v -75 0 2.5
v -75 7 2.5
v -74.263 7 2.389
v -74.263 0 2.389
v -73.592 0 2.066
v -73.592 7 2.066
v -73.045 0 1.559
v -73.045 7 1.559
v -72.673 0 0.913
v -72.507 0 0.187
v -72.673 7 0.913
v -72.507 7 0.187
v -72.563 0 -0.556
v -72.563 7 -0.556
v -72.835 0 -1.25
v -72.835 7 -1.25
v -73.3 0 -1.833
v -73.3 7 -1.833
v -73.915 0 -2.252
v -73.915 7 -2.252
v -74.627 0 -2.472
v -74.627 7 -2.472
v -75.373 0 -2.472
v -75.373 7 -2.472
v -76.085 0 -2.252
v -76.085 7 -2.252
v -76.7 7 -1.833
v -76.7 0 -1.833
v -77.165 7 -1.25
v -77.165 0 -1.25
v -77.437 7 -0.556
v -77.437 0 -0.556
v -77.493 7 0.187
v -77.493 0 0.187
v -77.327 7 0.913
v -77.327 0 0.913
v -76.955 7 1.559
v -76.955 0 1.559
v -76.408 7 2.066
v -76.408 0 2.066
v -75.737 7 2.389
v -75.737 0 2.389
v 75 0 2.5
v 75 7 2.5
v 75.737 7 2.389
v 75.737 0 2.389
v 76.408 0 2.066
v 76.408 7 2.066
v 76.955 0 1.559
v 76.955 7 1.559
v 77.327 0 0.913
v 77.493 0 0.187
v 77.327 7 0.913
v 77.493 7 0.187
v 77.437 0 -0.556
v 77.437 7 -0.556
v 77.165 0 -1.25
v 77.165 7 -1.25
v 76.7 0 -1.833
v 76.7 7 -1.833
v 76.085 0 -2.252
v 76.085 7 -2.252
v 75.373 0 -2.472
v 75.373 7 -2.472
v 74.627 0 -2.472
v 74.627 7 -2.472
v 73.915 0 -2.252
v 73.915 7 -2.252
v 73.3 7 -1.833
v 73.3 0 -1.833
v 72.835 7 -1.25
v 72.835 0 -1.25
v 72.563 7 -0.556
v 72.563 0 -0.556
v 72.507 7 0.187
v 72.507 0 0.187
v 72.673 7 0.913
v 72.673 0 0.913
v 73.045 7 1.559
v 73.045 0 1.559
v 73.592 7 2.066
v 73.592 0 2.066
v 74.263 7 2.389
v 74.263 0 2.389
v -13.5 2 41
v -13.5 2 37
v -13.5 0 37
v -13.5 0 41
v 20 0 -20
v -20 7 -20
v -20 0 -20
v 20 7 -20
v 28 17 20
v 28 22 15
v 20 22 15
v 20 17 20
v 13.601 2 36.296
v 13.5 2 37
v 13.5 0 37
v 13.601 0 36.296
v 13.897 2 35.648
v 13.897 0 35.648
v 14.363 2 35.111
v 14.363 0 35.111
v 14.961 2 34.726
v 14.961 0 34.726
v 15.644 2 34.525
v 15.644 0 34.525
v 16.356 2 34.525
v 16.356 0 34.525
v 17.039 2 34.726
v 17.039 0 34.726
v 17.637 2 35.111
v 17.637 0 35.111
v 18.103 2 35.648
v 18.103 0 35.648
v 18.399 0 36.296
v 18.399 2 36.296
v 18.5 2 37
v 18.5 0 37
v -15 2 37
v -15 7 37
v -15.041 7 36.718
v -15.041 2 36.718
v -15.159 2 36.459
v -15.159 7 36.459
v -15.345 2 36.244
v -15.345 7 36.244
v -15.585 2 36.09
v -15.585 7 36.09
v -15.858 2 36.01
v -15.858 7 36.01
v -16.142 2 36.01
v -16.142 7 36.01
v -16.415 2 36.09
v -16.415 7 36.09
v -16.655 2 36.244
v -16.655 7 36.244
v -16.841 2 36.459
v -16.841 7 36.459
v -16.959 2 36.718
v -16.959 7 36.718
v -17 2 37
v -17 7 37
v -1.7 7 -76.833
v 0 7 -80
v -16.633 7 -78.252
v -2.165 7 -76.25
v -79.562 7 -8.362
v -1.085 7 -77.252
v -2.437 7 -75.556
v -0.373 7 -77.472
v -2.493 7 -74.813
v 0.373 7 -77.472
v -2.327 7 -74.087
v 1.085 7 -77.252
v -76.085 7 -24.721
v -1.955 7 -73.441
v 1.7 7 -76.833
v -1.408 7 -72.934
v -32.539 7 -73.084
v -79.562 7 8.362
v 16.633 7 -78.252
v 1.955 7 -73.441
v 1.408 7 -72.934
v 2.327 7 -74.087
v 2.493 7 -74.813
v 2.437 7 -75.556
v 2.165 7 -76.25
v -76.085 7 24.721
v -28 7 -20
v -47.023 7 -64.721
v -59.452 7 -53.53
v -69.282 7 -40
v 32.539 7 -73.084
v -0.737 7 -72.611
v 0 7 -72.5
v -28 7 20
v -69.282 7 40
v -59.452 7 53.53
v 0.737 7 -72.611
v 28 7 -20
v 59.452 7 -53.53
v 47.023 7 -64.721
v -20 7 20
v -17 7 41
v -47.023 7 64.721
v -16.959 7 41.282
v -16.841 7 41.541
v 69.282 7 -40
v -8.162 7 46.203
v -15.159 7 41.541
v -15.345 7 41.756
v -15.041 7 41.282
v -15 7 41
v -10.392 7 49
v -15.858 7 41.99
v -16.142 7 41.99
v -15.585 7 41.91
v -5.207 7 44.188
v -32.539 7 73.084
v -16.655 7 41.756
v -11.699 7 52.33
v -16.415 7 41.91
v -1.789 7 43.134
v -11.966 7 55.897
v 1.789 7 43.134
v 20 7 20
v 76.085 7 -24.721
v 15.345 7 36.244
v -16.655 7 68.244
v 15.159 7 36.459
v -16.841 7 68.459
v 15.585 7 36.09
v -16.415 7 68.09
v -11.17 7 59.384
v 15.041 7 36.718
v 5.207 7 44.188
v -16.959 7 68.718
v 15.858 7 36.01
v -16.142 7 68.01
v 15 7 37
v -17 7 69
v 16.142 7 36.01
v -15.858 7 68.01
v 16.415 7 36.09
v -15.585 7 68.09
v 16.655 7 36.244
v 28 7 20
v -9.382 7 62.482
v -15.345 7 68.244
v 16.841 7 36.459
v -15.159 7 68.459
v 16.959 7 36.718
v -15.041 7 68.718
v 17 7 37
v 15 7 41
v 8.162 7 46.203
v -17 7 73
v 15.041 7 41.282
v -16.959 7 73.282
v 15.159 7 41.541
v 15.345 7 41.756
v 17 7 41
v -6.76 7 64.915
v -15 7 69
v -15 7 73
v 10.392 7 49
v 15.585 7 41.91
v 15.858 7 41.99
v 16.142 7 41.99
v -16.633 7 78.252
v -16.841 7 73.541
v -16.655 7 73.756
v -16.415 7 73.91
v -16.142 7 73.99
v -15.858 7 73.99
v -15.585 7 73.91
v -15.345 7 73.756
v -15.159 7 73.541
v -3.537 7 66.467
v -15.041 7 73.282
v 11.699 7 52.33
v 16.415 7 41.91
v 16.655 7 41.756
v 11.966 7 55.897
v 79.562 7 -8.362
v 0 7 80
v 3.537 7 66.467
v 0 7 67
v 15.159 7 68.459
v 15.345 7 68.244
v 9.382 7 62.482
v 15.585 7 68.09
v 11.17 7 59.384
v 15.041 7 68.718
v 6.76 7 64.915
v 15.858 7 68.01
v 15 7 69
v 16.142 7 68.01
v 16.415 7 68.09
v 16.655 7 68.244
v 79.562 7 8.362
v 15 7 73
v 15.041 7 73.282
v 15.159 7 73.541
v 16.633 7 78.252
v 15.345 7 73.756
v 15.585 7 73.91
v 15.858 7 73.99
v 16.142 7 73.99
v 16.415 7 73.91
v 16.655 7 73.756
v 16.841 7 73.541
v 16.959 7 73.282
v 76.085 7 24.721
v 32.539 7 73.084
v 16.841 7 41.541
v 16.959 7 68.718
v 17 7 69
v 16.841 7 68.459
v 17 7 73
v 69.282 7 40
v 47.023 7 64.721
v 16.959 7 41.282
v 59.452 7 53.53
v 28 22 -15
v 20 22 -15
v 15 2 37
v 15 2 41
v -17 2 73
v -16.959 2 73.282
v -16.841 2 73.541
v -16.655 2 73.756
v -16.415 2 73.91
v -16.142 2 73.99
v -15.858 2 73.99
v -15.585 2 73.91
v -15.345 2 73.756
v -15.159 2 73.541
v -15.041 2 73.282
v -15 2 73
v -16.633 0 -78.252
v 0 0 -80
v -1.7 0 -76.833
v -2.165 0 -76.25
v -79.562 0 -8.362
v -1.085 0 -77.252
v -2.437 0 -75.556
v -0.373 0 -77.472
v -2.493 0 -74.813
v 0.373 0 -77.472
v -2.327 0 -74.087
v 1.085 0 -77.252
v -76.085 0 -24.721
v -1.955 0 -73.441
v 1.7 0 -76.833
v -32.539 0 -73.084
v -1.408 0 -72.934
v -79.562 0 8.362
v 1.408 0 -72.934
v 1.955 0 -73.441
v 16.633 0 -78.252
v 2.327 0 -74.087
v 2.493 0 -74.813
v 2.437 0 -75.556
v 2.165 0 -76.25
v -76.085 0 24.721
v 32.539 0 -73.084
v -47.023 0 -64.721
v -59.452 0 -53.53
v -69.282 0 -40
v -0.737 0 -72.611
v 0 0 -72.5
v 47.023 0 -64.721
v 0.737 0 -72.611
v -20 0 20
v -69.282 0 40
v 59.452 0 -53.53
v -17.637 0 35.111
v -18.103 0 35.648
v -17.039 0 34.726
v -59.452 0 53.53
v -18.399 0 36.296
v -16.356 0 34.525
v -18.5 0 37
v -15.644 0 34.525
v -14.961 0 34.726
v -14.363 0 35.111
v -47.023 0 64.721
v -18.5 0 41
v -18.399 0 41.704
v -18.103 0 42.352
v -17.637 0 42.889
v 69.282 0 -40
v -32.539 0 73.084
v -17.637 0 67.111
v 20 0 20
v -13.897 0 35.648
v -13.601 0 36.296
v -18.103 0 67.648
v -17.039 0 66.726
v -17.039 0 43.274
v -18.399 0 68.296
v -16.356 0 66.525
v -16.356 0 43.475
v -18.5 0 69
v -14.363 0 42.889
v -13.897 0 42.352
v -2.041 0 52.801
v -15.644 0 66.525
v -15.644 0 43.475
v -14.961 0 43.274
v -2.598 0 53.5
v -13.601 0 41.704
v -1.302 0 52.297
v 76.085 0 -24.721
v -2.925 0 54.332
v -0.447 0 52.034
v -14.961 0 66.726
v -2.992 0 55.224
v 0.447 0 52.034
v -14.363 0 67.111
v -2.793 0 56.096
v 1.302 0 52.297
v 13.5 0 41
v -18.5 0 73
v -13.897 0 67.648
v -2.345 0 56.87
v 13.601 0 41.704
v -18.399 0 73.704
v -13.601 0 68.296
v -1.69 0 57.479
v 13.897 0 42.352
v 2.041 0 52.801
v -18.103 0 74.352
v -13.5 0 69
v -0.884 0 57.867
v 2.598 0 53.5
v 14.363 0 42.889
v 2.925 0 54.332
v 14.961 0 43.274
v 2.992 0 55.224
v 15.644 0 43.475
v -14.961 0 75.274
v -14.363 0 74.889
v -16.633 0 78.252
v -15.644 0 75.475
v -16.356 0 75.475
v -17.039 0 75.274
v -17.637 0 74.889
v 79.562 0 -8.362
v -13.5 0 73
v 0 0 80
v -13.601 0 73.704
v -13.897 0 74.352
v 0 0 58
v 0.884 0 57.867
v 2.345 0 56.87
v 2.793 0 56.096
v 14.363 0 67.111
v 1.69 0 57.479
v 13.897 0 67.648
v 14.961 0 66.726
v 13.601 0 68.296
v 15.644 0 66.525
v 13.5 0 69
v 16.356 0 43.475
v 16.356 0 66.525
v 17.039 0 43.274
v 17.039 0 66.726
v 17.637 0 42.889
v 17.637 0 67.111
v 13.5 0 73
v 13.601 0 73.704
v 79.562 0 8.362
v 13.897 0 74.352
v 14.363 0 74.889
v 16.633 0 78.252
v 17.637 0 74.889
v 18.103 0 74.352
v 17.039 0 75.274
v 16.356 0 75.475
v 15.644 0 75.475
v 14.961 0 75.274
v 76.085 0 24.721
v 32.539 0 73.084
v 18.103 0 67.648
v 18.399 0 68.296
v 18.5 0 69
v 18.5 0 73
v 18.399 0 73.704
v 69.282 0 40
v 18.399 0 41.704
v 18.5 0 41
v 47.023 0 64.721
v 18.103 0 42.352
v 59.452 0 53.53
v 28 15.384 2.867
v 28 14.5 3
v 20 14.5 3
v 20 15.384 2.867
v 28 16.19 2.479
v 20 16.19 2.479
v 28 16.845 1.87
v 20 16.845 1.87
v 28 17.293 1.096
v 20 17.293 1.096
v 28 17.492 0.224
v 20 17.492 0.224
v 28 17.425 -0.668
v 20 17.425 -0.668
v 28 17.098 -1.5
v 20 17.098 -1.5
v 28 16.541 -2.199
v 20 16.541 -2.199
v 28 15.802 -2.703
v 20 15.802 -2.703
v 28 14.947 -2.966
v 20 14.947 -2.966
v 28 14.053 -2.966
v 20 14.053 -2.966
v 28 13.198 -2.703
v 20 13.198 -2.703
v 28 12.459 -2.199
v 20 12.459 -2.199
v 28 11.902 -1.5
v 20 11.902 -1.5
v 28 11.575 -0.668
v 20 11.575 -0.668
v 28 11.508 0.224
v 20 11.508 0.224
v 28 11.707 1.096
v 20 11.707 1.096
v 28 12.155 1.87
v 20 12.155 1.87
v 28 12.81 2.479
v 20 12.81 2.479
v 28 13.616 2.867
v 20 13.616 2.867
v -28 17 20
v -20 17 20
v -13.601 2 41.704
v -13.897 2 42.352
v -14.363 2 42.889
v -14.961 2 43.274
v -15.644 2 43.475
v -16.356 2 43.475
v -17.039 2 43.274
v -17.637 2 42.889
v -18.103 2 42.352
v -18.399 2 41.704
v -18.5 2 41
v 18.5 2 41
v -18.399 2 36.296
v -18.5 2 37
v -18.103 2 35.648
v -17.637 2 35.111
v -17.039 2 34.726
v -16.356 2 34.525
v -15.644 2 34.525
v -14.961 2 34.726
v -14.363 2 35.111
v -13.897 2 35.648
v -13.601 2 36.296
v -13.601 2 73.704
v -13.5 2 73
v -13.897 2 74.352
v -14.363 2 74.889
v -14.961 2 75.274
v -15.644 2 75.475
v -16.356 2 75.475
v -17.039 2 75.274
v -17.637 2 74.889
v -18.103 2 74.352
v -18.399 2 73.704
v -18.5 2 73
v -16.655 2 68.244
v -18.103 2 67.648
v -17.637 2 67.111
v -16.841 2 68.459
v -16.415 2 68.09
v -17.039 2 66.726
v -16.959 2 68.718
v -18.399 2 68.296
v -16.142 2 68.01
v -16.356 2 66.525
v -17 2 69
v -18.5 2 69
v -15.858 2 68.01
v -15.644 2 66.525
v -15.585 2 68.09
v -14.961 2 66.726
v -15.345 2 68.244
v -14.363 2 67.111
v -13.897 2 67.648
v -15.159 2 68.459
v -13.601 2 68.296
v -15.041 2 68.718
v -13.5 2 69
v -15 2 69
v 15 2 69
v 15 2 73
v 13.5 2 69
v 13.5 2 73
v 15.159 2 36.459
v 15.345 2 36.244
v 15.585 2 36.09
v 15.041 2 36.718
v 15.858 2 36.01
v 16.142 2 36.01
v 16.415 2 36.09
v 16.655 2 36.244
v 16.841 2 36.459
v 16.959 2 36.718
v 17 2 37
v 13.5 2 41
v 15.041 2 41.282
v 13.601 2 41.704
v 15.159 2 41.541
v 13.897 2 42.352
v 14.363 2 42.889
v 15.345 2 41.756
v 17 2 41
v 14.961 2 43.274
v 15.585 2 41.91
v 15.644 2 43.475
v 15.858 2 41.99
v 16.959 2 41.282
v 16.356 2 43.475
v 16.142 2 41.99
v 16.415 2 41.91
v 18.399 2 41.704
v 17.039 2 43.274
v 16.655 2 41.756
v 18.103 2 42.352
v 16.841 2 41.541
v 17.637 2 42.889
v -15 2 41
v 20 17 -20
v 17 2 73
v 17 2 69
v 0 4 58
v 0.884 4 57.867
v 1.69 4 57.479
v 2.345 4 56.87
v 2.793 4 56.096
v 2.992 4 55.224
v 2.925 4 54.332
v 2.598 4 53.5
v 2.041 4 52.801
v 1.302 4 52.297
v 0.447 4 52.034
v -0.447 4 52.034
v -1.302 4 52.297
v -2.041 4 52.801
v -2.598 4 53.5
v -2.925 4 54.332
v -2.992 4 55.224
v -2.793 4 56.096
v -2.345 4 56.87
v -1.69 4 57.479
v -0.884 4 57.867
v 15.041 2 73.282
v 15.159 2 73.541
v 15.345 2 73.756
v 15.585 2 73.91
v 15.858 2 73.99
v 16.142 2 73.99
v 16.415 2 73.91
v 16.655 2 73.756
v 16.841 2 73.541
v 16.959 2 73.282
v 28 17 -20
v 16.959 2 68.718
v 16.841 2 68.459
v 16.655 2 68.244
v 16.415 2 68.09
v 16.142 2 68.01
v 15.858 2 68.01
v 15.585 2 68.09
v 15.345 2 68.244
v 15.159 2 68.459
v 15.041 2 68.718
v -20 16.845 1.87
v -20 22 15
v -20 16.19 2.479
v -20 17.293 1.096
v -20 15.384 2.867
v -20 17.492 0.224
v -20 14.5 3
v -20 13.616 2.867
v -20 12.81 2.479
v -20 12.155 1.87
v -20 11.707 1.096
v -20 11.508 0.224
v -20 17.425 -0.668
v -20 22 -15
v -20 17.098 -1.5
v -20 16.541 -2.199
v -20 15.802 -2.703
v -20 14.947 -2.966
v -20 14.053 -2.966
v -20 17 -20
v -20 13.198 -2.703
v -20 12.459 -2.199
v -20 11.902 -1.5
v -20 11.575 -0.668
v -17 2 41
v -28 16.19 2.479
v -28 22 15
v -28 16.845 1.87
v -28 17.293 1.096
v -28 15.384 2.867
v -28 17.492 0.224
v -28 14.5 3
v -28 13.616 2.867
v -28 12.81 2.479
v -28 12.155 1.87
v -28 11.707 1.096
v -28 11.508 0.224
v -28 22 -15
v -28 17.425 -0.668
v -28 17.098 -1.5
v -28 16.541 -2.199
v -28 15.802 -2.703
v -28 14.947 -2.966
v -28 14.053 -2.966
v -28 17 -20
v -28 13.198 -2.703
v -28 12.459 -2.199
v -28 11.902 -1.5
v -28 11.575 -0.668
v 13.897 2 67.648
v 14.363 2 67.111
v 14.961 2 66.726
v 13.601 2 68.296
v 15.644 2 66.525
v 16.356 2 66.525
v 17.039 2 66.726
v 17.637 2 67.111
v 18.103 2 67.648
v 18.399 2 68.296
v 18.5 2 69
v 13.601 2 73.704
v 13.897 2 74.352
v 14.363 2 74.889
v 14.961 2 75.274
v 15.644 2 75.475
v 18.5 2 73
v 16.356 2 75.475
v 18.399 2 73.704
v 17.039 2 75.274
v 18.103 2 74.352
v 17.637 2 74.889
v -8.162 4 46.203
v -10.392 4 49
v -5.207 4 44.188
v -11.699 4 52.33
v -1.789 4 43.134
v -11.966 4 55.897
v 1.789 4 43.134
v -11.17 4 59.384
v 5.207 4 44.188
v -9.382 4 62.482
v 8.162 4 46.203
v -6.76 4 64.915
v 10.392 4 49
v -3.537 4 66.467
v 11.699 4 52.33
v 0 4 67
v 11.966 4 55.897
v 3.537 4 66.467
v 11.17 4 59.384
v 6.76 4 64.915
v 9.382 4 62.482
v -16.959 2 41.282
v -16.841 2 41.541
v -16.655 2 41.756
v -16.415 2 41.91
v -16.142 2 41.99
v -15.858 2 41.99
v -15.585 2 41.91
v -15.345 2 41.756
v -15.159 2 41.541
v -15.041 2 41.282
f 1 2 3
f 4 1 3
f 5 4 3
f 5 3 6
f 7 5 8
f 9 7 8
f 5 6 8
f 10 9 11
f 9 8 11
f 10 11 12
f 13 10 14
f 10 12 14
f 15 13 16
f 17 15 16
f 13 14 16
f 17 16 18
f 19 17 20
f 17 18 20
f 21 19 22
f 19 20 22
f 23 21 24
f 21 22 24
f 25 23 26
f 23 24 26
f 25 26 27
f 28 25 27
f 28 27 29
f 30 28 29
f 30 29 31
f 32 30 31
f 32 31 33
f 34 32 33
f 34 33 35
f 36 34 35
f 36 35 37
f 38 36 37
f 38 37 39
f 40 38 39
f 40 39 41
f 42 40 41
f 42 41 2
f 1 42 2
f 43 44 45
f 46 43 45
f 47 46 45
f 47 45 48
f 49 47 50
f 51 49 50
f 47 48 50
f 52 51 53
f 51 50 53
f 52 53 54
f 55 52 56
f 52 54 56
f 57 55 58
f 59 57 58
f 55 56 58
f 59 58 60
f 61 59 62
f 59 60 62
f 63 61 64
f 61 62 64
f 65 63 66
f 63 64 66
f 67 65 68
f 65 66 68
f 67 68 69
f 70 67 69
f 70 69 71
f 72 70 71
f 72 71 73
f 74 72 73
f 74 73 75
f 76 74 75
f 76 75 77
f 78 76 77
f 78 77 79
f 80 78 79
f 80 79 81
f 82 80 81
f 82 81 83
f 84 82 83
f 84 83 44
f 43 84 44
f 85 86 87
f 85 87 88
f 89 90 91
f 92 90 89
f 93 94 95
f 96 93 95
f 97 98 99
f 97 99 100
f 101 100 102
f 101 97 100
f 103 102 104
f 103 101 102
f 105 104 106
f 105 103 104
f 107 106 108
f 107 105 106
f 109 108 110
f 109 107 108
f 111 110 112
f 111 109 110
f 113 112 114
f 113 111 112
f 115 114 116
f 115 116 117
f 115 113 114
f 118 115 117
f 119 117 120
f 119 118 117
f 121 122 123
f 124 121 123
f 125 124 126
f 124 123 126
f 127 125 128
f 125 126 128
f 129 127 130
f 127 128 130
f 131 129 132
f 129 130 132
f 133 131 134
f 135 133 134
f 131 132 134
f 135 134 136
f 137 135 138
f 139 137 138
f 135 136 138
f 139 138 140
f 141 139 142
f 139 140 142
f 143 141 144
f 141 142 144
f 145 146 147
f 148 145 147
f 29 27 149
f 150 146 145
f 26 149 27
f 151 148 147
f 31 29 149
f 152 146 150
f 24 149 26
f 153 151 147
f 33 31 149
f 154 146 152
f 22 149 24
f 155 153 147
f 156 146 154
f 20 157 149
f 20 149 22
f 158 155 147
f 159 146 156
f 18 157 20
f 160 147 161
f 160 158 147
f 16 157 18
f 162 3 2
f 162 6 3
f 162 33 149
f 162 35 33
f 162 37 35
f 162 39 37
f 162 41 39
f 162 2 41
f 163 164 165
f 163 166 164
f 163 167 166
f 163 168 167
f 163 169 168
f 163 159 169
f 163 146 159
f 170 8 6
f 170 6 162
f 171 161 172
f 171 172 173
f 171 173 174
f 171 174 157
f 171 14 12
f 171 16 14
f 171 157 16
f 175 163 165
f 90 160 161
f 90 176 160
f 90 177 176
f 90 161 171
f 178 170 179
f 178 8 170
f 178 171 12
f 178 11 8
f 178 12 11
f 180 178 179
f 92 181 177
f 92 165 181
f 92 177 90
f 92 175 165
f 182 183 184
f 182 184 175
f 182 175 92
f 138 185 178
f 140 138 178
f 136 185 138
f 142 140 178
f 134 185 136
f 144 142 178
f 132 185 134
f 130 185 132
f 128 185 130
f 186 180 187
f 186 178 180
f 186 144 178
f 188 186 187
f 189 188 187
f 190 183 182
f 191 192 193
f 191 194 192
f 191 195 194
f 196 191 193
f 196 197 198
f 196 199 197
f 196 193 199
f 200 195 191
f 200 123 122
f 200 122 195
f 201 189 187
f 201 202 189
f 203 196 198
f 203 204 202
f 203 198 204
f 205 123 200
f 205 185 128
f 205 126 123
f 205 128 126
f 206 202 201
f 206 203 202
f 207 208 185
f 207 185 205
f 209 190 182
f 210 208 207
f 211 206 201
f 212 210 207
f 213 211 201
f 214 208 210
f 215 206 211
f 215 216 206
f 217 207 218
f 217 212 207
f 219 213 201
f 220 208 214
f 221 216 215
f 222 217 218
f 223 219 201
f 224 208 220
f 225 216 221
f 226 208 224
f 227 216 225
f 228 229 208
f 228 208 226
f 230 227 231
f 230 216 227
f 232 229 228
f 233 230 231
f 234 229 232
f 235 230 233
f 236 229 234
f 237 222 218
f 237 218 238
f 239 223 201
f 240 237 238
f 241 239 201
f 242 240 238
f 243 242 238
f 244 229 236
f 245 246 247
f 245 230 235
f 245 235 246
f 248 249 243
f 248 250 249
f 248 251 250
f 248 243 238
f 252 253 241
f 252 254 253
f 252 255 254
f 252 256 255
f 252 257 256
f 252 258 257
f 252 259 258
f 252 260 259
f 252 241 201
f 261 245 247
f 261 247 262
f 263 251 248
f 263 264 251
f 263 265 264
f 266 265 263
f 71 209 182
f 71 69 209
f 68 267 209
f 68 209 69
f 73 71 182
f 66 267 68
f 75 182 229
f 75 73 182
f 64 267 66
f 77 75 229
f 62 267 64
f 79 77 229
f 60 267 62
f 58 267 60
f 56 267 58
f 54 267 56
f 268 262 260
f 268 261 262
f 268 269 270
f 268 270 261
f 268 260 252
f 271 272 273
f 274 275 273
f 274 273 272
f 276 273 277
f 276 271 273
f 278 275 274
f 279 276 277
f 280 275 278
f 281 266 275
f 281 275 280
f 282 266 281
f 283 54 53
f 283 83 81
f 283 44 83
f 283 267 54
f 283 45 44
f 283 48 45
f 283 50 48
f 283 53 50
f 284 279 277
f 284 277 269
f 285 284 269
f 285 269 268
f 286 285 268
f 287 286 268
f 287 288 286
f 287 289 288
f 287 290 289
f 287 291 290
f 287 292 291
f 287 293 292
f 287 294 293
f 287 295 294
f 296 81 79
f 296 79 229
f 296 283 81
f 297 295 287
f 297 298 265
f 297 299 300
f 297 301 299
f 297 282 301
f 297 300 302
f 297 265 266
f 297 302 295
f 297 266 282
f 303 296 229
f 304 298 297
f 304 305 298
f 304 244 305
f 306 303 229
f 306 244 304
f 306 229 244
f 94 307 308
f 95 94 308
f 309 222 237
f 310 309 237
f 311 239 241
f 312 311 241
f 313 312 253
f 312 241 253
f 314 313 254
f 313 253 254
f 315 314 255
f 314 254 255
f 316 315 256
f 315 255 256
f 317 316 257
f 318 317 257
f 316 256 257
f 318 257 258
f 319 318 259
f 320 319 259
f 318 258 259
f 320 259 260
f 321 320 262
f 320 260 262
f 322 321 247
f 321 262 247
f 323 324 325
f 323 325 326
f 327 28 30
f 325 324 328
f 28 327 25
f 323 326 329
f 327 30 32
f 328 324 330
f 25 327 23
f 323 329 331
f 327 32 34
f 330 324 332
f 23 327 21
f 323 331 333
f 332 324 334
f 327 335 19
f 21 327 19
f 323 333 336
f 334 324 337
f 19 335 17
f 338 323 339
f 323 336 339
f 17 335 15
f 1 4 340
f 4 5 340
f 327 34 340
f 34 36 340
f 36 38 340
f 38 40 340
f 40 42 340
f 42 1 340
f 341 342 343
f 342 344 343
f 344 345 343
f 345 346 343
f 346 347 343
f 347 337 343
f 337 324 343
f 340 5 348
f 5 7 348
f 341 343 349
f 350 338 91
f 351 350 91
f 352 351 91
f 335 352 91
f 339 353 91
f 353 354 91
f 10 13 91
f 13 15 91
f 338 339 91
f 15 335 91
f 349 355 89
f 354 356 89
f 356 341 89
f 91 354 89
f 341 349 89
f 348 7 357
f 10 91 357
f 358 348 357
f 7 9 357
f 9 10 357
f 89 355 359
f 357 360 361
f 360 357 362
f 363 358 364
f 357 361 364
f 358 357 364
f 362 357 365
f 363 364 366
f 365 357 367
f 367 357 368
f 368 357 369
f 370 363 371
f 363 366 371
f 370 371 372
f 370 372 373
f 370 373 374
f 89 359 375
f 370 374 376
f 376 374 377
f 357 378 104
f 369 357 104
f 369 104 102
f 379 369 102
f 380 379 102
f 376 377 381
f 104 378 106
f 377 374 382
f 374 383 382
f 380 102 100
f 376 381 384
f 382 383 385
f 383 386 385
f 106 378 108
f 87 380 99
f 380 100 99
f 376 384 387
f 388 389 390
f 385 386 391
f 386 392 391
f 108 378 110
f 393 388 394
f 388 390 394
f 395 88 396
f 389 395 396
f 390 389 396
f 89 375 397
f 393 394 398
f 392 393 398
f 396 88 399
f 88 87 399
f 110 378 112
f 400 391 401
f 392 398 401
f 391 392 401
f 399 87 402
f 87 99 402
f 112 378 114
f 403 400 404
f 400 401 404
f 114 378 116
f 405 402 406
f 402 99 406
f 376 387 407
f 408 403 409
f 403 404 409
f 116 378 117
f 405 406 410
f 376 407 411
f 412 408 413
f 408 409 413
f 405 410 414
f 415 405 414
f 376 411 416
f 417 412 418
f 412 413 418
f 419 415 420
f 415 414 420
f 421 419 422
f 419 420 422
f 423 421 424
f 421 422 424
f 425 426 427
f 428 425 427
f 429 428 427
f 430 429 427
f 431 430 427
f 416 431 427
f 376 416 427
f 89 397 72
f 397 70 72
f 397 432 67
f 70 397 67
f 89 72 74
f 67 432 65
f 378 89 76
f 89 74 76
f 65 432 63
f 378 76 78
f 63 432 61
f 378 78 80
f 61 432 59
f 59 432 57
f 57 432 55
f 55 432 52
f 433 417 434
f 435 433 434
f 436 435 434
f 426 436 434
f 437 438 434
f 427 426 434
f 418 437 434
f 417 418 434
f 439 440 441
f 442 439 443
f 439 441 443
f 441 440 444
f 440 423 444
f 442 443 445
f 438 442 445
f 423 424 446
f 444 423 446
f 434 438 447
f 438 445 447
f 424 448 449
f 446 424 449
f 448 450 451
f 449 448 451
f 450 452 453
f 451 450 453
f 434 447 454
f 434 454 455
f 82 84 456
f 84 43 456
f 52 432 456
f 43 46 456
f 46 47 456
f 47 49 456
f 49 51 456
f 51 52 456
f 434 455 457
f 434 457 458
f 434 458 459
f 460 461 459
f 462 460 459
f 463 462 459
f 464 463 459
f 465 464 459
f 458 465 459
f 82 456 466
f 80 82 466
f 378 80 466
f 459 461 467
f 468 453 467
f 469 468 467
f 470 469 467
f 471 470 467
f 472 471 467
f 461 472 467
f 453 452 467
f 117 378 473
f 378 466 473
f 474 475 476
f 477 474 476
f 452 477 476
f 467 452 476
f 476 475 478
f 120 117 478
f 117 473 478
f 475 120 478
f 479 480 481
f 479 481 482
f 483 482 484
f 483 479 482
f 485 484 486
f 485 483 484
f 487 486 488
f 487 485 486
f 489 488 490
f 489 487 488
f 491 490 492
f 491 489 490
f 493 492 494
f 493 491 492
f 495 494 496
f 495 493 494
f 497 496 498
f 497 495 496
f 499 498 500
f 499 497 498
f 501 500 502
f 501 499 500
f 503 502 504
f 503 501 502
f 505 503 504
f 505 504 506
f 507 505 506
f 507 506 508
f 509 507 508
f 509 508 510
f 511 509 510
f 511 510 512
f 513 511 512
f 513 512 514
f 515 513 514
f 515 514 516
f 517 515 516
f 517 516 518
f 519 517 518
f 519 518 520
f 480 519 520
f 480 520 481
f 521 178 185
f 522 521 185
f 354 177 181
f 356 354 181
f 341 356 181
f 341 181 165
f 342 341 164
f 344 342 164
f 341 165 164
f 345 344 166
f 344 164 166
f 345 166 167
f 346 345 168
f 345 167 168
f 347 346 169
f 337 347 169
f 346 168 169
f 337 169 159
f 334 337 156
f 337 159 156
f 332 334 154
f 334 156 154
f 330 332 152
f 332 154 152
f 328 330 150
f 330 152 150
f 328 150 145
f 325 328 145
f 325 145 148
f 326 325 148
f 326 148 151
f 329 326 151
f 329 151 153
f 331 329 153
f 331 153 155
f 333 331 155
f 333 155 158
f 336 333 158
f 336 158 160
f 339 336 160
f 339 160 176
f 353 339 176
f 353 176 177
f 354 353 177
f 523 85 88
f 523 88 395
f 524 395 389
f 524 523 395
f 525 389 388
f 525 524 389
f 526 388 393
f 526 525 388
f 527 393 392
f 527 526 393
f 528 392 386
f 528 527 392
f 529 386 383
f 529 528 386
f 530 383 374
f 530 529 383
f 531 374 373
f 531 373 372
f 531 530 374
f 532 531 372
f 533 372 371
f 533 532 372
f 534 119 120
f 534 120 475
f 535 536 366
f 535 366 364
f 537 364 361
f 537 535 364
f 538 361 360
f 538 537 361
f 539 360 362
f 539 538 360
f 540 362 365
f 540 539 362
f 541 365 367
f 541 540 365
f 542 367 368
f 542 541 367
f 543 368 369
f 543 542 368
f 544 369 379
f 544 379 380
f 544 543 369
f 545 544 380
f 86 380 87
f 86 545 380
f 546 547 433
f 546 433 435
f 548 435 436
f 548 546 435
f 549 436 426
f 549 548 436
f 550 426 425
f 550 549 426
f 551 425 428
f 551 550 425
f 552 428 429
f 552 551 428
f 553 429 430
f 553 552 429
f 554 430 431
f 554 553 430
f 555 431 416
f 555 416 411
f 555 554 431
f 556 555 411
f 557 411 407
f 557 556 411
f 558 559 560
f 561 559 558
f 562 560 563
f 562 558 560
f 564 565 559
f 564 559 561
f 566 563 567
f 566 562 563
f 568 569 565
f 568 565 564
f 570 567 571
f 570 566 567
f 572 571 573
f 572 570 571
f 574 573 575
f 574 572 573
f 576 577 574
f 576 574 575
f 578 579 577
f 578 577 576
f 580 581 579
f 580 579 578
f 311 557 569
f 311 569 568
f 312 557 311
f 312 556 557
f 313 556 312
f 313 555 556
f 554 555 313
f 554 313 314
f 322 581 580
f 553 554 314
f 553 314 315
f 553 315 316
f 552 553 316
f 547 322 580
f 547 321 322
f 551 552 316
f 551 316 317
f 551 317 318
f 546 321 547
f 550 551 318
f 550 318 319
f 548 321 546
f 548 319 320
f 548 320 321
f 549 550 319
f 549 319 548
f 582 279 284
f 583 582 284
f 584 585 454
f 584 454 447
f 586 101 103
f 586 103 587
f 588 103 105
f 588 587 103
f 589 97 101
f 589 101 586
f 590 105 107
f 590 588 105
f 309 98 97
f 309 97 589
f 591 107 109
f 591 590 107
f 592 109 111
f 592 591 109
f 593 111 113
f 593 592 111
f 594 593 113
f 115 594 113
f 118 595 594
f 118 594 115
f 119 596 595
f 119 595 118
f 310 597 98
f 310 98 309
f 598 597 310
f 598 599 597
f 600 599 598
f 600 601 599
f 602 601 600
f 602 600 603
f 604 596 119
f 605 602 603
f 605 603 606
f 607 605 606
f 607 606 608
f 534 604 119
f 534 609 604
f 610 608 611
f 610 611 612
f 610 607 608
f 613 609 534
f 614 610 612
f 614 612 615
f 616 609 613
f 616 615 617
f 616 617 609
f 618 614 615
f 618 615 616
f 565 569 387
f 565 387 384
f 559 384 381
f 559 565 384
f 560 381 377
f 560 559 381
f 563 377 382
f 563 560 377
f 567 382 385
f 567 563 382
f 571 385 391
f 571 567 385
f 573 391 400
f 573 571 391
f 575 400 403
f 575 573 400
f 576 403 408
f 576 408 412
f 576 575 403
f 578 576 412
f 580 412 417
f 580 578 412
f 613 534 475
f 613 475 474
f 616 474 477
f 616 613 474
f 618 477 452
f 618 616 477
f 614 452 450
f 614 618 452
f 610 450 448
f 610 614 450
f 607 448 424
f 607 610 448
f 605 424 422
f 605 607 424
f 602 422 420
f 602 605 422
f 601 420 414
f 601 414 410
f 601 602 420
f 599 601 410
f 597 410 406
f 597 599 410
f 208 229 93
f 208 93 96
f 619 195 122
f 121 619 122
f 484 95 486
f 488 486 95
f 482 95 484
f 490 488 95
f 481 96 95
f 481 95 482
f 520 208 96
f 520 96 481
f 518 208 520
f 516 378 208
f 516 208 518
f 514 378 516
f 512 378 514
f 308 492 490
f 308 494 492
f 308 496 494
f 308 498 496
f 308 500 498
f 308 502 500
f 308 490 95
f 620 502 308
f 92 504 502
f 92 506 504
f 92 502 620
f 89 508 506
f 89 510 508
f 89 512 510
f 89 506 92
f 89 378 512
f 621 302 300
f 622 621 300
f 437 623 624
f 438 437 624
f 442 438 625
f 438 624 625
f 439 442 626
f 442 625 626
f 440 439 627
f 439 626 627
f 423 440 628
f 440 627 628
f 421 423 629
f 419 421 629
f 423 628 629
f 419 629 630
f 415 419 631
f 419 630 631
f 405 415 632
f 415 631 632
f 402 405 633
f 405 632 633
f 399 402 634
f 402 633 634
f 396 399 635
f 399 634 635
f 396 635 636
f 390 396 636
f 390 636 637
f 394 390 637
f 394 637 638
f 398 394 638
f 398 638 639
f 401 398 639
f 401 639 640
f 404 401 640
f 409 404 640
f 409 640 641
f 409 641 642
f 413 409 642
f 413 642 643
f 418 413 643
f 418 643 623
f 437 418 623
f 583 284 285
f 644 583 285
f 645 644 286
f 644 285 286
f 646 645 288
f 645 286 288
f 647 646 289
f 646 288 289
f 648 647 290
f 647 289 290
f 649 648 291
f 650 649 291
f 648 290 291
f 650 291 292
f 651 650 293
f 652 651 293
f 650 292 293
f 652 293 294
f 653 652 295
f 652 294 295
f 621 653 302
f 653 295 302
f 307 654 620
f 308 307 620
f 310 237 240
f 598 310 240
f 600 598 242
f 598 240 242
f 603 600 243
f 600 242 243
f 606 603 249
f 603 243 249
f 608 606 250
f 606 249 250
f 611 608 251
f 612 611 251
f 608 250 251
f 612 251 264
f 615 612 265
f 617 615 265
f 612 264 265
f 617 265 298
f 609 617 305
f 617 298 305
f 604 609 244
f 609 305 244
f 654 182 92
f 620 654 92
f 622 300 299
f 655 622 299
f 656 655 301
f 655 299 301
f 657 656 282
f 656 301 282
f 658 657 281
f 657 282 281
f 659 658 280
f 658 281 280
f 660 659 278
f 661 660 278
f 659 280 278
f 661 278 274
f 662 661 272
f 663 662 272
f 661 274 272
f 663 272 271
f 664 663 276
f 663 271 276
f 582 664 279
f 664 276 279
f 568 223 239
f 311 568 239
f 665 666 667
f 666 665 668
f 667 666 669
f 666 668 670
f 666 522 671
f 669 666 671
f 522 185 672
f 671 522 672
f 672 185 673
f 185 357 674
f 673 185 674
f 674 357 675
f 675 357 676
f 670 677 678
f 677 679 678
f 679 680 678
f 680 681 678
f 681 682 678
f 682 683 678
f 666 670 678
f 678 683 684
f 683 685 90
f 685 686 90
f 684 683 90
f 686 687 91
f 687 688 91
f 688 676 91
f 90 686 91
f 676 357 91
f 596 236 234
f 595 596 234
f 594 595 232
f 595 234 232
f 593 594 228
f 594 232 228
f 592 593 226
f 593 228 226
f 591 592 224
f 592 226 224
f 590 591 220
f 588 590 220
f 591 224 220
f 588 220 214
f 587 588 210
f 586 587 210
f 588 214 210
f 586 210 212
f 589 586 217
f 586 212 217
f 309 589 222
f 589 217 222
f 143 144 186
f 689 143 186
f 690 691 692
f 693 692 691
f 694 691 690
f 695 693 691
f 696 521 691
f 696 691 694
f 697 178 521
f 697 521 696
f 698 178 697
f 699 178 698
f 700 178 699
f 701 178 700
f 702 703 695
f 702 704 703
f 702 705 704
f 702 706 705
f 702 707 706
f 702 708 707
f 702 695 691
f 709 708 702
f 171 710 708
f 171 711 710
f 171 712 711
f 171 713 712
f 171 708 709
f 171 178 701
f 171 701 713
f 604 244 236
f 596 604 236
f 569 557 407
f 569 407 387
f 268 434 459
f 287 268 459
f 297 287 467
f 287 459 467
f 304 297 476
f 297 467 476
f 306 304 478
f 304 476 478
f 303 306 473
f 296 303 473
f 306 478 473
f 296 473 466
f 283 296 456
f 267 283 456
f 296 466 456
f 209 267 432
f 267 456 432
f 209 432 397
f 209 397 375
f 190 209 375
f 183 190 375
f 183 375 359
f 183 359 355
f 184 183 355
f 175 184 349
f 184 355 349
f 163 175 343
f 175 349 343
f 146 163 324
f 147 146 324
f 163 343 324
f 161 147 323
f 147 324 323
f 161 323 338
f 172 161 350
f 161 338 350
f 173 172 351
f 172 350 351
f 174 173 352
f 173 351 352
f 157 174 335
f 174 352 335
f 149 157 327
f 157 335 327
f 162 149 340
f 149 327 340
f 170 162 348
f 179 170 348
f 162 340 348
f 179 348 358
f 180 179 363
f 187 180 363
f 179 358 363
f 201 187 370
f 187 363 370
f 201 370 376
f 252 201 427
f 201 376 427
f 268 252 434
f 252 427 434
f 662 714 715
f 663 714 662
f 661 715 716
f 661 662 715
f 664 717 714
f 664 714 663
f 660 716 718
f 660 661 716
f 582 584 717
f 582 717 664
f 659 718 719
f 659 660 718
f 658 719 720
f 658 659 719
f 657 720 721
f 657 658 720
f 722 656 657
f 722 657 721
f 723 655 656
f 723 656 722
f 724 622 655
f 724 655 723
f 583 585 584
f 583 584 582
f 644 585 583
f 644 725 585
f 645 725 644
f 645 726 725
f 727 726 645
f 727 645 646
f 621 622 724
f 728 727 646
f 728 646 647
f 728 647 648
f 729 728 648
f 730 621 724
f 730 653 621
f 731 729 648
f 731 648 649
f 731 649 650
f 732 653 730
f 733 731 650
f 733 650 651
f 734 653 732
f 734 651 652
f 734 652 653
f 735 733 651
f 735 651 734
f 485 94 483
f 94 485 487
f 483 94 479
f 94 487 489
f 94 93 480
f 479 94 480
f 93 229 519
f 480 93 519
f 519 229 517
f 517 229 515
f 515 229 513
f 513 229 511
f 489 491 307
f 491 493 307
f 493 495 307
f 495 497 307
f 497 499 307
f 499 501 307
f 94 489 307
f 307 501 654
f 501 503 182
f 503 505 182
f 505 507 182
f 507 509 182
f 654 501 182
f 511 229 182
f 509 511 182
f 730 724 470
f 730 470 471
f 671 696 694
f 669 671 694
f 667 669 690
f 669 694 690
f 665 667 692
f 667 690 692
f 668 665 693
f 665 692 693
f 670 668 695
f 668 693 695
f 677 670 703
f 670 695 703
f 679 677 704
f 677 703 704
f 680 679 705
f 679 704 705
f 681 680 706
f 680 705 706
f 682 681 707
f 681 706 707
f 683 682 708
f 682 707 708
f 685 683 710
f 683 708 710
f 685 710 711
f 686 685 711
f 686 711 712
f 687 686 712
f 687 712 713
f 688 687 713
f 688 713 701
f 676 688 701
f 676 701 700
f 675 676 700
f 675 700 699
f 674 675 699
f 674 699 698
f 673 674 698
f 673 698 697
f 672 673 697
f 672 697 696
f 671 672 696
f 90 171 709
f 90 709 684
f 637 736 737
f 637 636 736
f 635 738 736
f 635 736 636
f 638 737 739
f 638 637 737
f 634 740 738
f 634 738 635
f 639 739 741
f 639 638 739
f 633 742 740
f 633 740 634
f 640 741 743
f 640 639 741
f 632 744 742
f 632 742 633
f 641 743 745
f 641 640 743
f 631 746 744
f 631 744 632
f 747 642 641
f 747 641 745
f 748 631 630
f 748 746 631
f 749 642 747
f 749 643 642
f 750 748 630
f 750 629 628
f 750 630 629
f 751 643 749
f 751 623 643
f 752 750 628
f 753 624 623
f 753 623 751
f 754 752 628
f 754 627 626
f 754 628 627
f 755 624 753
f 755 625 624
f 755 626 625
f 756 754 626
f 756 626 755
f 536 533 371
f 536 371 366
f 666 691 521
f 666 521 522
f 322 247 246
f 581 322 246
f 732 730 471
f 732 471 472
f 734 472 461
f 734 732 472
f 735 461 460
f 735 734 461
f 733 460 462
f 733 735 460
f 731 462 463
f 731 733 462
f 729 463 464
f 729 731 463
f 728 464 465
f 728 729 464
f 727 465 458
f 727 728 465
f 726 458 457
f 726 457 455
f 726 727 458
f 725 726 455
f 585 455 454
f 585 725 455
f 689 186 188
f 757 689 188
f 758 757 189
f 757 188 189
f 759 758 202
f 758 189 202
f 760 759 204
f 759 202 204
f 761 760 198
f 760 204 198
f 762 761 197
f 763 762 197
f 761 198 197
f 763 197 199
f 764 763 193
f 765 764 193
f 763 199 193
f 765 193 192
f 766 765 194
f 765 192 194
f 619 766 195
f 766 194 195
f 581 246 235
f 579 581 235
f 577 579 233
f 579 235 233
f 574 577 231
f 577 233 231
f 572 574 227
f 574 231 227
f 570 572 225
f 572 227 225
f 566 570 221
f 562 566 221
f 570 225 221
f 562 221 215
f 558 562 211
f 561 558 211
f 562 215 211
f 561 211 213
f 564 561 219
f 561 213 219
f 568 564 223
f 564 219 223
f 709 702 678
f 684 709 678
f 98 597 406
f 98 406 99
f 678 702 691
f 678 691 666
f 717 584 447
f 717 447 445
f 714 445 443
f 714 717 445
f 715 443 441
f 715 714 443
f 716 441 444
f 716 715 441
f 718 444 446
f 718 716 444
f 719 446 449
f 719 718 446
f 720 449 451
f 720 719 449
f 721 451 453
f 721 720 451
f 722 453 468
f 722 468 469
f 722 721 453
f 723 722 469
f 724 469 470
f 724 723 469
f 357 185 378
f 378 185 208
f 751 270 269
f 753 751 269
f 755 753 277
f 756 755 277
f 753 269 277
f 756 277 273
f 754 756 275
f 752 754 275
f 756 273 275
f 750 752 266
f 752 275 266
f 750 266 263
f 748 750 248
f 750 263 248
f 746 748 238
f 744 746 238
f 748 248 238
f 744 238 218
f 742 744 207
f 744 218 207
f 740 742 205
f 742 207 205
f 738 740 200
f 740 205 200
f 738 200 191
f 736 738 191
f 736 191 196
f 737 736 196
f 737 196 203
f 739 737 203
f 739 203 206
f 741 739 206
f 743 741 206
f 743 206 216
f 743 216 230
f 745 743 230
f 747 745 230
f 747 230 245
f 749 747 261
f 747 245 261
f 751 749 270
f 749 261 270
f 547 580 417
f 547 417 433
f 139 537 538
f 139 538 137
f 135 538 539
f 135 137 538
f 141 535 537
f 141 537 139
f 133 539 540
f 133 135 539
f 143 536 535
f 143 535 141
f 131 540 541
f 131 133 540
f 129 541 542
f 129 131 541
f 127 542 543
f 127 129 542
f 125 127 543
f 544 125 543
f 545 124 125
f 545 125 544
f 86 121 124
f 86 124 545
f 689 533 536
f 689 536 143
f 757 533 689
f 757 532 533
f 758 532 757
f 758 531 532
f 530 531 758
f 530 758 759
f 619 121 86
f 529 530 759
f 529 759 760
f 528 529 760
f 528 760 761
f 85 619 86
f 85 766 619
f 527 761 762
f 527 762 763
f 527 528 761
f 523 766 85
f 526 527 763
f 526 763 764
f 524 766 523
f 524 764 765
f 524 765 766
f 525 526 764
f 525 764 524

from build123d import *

# Parameters (mm, degrees)
SKETCH1_R               = 80
BOSS_EXTRUDE1_DEPTH     = 7
CUT_EXTRUDE1_REACH      = 115.353
SKETCH2_R               = 2.5
CUT_EXTRUDE2_REACH      = 115.353
SKETCH3_W               = 40
SKETCH3_H               = 40
SKETCH5_W               = 8
SKETCH5_H               = 40
BOSS_EXTRUDE2_DEPTH     = 15
FILLET1_SIZE            = 5
CUT_EXTRUDE4_REACH      = 138.191
SKETCH6_R               = 3
FILLET1_OF_MIRROR1_SIZE = 5
CUT_EXTRUDE3_REACH      = 116.127
SKETCH4_R               = 3
CUT_EXTRUDE5_START      = -2
CUT_EXTRUDE5_DEPTH      = 2
SKETCH8_R               = 12
CUT_EXTRUDE6_DEPTH      = 3


with BuildPart() as part:
    # Sketch1 → Boss-Extrude1 (new body)
    with BuildSketch(Plane(origin=(0, 0, 0), x_dir=(1, 0, 0), z_dir=(0, 1, 0))):
        with Locations(Location((0, 0, 0), (0, 0, 270))):
            Circle(SKETCH1_R)
    extrude(amount=BOSS_EXTRUDE1_DEPTH)

    # Sketch2 → Cut-Extrude1 (cut, up to next)
    with BuildSketch(Plane(origin=(0, 7, 0), x_dir=(1, 0, 0), z_dir=(0, 1, 0)), mode=Mode.PRIVATE) as cut_extrude1_sk1:
        with Locations(Location((-75, 0, 0), (0, 0, 270))):
            Circle(SKETCH2_R)
    cut_extrude1_tool1 = extrude(cut_extrude1_sk1.sketch, amount=-CUT_EXTRUDE1_REACH, mode=Mode.PRIVATE) & part.part
    # Sketch2 → Cut-Extrude1 (cut, up to next)
    with BuildSketch(Plane(origin=(0, 7, 0), x_dir=(1, 0, 0), z_dir=(0, 1, 0)), mode=Mode.PRIVATE) as cut_extrude1_sk2:
        with Locations(Location((0, 75, 0), (0, 0, 270))):
            Circle(SKETCH2_R)
    cut_extrude1_tool2 = extrude(cut_extrude1_sk2.sketch, amount=-CUT_EXTRUDE1_REACH, mode=Mode.PRIVATE) & part.part
    # Sketch2 → Cut-Extrude1 (cut, up to next)
    with BuildSketch(Plane(origin=(0, 7, 0), x_dir=(1, 0, 0), z_dir=(0, 1, 0)), mode=Mode.PRIVATE) as cut_extrude1_sk3:
        with Locations(Location((75, 0, 0), (0, 0, 270))):
            Circle(SKETCH2_R)
    cut_extrude1_tool3 = extrude(cut_extrude1_sk3.sketch, amount=-CUT_EXTRUDE1_REACH, mode=Mode.PRIVATE) & part.part
    add(cut_extrude1_tool1.solids().sort_by_distance((-75, 7, 0))[0], mode=Mode.SUBTRACT)
    add(cut_extrude1_tool2.solids().sort_by_distance((0, 7, -75))[0], mode=Mode.SUBTRACT)
    add(cut_extrude1_tool3.solids().sort_by_distance((75, 7, 0))[0], mode=Mode.SUBTRACT)

    # Sketch3 → Cut-Extrude2 (cut, up to next)
    with BuildSketch(Plane(origin=(0, 7, 0), x_dir=(1, 0, 0), z_dir=(0, 1, 0)), mode=Mode.PRIVATE) as cut_extrude2_sk1:
        Rectangle(SKETCH3_W, SKETCH3_H)
    cut_extrude2_tool1 = extrude(cut_extrude2_sk1.sketch, amount=-CUT_EXTRUDE2_REACH, mode=Mode.PRIVATE) & part.part
    add(cut_extrude2_tool1.solids().sort_by_distance((0, 7, 0))[0], mode=Mode.SUBTRACT)

    # Sketch5 → Boss-Extrude2 (add)
    with BuildSketch(Plane(origin=(0, 7, 0), x_dir=(1, 0, 0), z_dir=(0, 1, 0))):
        with Locations((-24, 0)):
            Rectangle(SKETCH5_W, SKETCH5_H)
    boss_extrude2 = extrude(amount=BOSS_EXTRUDE2_DEPTH)

    # Fillet1
    fillet1_edges = [part.edges().sort_by_distance(p)[0] for p in [
        (-24, 22, -20),
        (-24, 22, 20),
    ]]
    chamfer(fillet1_edges, length=FILLET1_SIZE)

    # Sketch6 → Cut-Extrude4 (cut, up to next)
    with BuildSketch(Plane.ZY.offset(28), mode=Mode.PRIVATE) as cut_extrude4_sk1:
        with Locations((0, 14.5)):
            Circle(SKETCH6_R)
    cut_extrude4_tool1 = extrude(cut_extrude4_sk1.sketch, amount=-CUT_EXTRUDE4_REACH, mode=Mode.PRIVATE) & part.part
    cut_extrude4 = cut_extrude4_tool1.solids().sort_by_distance((-28, 14.5, 0))[0]
    add(cut_extrude4, mode=Mode.SUBTRACT)

    # Mirror1: Boss-Extrude2, Cut-Extrude4 across plane
    add(boss_extrude2.mirror(Plane.ZY))
    add(cut_extrude4.mirror(Plane.ZY), mode=Mode.SUBTRACT)

    # Fillet1 of Mirror1
    fillet1_of_mirror1_edges = [part.edges().sort_by_distance(p)[0] for p in [
        (24, 22, -20),
        (24, 22, 20),
    ]]
    chamfer(fillet1_of_mirror1_edges, length=FILLET1_OF_MIRROR1_SIZE)

    # Sketch4 → Cut-Extrude3 (cut, up to next)
    with BuildSketch(Plane(origin=(0, 7, 0), x_dir=(1, 0, 0), z_dir=(0, 1, 0)), mode=Mode.PRIVATE) as cut_extrude3_sk1:
        with BuildLine():
            Line((-17, -37), (-17, -41))
            ThreePointArc((-17, -41), (-16, -42), (-15, -41))
            Line((-15, -41), (-15, -37))
            ThreePointArc((-15, -37), (-16, -36), (-17, -37))
        make_face()
    cut_extrude3_tool1 = extrude(cut_extrude3_sk1.sketch, amount=-CUT_EXTRUDE3_REACH, mode=Mode.PRIVATE) & part.part
    # Sketch4 → Cut-Extrude3 (cut, up to next)
    with BuildSketch(Plane(origin=(0, 7, 0), x_dir=(1, 0, 0), z_dir=(0, 1, 0)), mode=Mode.PRIVATE) as cut_extrude3_sk2:
        with BuildLine():
            Line((15, -37), (15, -41))
            ThreePointArc((15, -41), (16, -42), (17, -41))
            Line((17, -41), (17, -37))
            ThreePointArc((17, -37), (16, -36), (15, -37))
        make_face()
    cut_extrude3_tool2 = extrude(cut_extrude3_sk2.sketch, amount=-CUT_EXTRUDE3_REACH, mode=Mode.PRIVATE) & part.part
    # Sketch4 → Cut-Extrude3 (cut, up to next)
    with BuildSketch(Plane(origin=(0, 7, 0), x_dir=(1, 0, 0), z_dir=(0, 1, 0)), mode=Mode.PRIVATE) as cut_extrude3_sk3:
        with BuildLine():
            Line((15, -69), (15, -73))
            ThreePointArc((15, -73), (16, -74), (17, -73))
            Line((17, -73), (17, -69))
            ThreePointArc((17, -69), (16, -68), (15, -69))
        make_face()
    cut_extrude3_tool3 = extrude(cut_extrude3_sk3.sketch, amount=-CUT_EXTRUDE3_REACH, mode=Mode.PRIVATE) & part.part
    # Sketch4 → Cut-Extrude3 (cut, up to next)
    with BuildSketch(Plane(origin=(0, 7, 0), x_dir=(1, 0, 0), z_dir=(0, 1, 0)), mode=Mode.PRIVATE) as cut_extrude3_sk4:
        with BuildLine():
            Line((-17, -69), (-17, -73))
            ThreePointArc((-17, -73), (-16, -74), (-15, -73))
            Line((-15, -73), (-15, -69))
            ThreePointArc((-15, -69), (-16, -68), (-17, -69))
        make_face()
    cut_extrude3_tool4 = extrude(cut_extrude3_sk4.sketch, amount=-CUT_EXTRUDE3_REACH, mode=Mode.PRIVATE) & part.part
    # Sketch4 → Cut-Extrude3 (cut, up to next)
    with BuildSketch(Plane(origin=(0, 7, 0), x_dir=(1, 0, 0), z_dir=(0, 1, 0)), mode=Mode.PRIVATE) as cut_extrude3_sk5:
        with Locations(Location((0, -55, 0), (0, 0, 270))):
            Circle(SKETCH4_R)
    cut_extrude3_tool5 = extrude(cut_extrude3_sk5.sketch, amount=-CUT_EXTRUDE3_REACH, mode=Mode.PRIVATE) & part.part
    add(cut_extrude3_tool1.solids().sort_by_distance((-16, 7, 39))[0], mode=Mode.SUBTRACT)
    add(cut_extrude3_tool2.solids().sort_by_distance((16, 7, 39))[0], mode=Mode.SUBTRACT)
    add(cut_extrude3_tool3.solids().sort_by_distance((16, 7, 71))[0], mode=Mode.SUBTRACT)
    add(cut_extrude3_tool4.solids().sort_by_distance((-16, 7, 71))[0], mode=Mode.SUBTRACT)
    add(cut_extrude3_tool5.solids().sort_by_distance((0, 7, 55))[0], mode=Mode.SUBTRACT)

    # Sketch7 → Cut-Extrude5 (cut)
    # profile 1 of 4: a face of its own
    with BuildSketch(Plane.XZ.offset(CUT_EXTRUDE5_START)):
        with BuildLine():
            Line((-13.5, 69), (-13.5, 73))
            ThreePointArc((-13.5, 73), (-16, 75.5), (-18.5, 73))
            Line((-18.5, 73), (-18.5, 69))
            ThreePointArc((-18.5, 69), (-16, 66.5), (-13.5, 69))
        make_face()
        with BuildLine():
            ThreePointArc((-15, 69), (-16, 68), (-17, 69))
            Line((-17, 69), (-17, 73))
            ThreePointArc((-17, 73), (-16, 74), (-15, 73))
            Line((-15, 73), (-15, 69))
        make_face(mode=Mode.SUBTRACT)
    # profile 2 of 4: a face of its own
    with BuildSketch(Plane.XZ.offset(CUT_EXTRUDE5_START)):
        with BuildLine():
            Line((18.5, 69), (18.5, 73))
            ThreePointArc((18.5, 73), (16, 75.5), (13.5, 73))
            Line((13.5, 73), (13.5, 69))
            ThreePointArc((13.5, 69), (16, 66.5), (18.5, 69))
        make_face()
        with BuildLine():
            ThreePointArc((17, 69), (16, 68), (15, 69))
            Line((15, 69), (15, 73))
            ThreePointArc((15, 73), (16, 74), (17, 73))
            Line((17, 73), (17, 69))
        make_face(mode=Mode.SUBTRACT)
    # profile 3 of 4: a face of its own
    with BuildSketch(Plane.XZ.offset(CUT_EXTRUDE5_START)):
        with BuildLine():
            Line((-13.5, 37), (-13.5, 41))
            ThreePointArc((-13.5, 41), (-16, 43.5), (-18.5, 41))
            Line((-18.5, 41), (-18.5, 37))
            ThreePointArc((-18.5, 37), (-16, 34.5), (-13.5, 37))
        make_face()
        with BuildLine():
            ThreePointArc((-15, 37), (-16, 36), (-17, 37))
            Line((-17, 37), (-17, 41))
            ThreePointArc((-17, 41), (-16, 42), (-15, 41))
            Line((-15, 41), (-15, 37))
        make_face(mode=Mode.SUBTRACT)
    # profile 4 of 4: a face of its own
    with BuildSketch(Plane.XZ.offset(CUT_EXTRUDE5_START)):
        with BuildLine():
            Line((18.5, 37), (18.5, 41))
            ThreePointArc((18.5, 41), (16, 43.5), (13.5, 41))
            Line((13.5, 41), (13.5, 37))
            ThreePointArc((13.5, 37), (16, 34.5), (18.5, 37))
        make_face()
        with BuildLine():
            ThreePointArc((17, 37), (16, 36), (15, 37))
            Line((15, 37), (15, 41))
            ThreePointArc((15, 41), (16, 42), (17, 41))
            Line((17, 41), (17, 37))
        make_face(mode=Mode.SUBTRACT)
    extrude(amount=CUT_EXTRUDE5_DEPTH, mode=Mode.SUBTRACT)

    # Sketch8 → Cut-Extrude6 (cut)
    with BuildSketch(Plane(origin=(0, 7, 0), x_dir=(1, 0, 0), z_dir=(0, 1, 0))):
        with Locations(Location((0, -55, 0), (0, 0, 270))):
            Circle(SKETCH8_R)
    extrude(amount=-CUT_EXTRUDE6_DEPTH, mode=Mode.SUBTRACT)


solid = part.part
